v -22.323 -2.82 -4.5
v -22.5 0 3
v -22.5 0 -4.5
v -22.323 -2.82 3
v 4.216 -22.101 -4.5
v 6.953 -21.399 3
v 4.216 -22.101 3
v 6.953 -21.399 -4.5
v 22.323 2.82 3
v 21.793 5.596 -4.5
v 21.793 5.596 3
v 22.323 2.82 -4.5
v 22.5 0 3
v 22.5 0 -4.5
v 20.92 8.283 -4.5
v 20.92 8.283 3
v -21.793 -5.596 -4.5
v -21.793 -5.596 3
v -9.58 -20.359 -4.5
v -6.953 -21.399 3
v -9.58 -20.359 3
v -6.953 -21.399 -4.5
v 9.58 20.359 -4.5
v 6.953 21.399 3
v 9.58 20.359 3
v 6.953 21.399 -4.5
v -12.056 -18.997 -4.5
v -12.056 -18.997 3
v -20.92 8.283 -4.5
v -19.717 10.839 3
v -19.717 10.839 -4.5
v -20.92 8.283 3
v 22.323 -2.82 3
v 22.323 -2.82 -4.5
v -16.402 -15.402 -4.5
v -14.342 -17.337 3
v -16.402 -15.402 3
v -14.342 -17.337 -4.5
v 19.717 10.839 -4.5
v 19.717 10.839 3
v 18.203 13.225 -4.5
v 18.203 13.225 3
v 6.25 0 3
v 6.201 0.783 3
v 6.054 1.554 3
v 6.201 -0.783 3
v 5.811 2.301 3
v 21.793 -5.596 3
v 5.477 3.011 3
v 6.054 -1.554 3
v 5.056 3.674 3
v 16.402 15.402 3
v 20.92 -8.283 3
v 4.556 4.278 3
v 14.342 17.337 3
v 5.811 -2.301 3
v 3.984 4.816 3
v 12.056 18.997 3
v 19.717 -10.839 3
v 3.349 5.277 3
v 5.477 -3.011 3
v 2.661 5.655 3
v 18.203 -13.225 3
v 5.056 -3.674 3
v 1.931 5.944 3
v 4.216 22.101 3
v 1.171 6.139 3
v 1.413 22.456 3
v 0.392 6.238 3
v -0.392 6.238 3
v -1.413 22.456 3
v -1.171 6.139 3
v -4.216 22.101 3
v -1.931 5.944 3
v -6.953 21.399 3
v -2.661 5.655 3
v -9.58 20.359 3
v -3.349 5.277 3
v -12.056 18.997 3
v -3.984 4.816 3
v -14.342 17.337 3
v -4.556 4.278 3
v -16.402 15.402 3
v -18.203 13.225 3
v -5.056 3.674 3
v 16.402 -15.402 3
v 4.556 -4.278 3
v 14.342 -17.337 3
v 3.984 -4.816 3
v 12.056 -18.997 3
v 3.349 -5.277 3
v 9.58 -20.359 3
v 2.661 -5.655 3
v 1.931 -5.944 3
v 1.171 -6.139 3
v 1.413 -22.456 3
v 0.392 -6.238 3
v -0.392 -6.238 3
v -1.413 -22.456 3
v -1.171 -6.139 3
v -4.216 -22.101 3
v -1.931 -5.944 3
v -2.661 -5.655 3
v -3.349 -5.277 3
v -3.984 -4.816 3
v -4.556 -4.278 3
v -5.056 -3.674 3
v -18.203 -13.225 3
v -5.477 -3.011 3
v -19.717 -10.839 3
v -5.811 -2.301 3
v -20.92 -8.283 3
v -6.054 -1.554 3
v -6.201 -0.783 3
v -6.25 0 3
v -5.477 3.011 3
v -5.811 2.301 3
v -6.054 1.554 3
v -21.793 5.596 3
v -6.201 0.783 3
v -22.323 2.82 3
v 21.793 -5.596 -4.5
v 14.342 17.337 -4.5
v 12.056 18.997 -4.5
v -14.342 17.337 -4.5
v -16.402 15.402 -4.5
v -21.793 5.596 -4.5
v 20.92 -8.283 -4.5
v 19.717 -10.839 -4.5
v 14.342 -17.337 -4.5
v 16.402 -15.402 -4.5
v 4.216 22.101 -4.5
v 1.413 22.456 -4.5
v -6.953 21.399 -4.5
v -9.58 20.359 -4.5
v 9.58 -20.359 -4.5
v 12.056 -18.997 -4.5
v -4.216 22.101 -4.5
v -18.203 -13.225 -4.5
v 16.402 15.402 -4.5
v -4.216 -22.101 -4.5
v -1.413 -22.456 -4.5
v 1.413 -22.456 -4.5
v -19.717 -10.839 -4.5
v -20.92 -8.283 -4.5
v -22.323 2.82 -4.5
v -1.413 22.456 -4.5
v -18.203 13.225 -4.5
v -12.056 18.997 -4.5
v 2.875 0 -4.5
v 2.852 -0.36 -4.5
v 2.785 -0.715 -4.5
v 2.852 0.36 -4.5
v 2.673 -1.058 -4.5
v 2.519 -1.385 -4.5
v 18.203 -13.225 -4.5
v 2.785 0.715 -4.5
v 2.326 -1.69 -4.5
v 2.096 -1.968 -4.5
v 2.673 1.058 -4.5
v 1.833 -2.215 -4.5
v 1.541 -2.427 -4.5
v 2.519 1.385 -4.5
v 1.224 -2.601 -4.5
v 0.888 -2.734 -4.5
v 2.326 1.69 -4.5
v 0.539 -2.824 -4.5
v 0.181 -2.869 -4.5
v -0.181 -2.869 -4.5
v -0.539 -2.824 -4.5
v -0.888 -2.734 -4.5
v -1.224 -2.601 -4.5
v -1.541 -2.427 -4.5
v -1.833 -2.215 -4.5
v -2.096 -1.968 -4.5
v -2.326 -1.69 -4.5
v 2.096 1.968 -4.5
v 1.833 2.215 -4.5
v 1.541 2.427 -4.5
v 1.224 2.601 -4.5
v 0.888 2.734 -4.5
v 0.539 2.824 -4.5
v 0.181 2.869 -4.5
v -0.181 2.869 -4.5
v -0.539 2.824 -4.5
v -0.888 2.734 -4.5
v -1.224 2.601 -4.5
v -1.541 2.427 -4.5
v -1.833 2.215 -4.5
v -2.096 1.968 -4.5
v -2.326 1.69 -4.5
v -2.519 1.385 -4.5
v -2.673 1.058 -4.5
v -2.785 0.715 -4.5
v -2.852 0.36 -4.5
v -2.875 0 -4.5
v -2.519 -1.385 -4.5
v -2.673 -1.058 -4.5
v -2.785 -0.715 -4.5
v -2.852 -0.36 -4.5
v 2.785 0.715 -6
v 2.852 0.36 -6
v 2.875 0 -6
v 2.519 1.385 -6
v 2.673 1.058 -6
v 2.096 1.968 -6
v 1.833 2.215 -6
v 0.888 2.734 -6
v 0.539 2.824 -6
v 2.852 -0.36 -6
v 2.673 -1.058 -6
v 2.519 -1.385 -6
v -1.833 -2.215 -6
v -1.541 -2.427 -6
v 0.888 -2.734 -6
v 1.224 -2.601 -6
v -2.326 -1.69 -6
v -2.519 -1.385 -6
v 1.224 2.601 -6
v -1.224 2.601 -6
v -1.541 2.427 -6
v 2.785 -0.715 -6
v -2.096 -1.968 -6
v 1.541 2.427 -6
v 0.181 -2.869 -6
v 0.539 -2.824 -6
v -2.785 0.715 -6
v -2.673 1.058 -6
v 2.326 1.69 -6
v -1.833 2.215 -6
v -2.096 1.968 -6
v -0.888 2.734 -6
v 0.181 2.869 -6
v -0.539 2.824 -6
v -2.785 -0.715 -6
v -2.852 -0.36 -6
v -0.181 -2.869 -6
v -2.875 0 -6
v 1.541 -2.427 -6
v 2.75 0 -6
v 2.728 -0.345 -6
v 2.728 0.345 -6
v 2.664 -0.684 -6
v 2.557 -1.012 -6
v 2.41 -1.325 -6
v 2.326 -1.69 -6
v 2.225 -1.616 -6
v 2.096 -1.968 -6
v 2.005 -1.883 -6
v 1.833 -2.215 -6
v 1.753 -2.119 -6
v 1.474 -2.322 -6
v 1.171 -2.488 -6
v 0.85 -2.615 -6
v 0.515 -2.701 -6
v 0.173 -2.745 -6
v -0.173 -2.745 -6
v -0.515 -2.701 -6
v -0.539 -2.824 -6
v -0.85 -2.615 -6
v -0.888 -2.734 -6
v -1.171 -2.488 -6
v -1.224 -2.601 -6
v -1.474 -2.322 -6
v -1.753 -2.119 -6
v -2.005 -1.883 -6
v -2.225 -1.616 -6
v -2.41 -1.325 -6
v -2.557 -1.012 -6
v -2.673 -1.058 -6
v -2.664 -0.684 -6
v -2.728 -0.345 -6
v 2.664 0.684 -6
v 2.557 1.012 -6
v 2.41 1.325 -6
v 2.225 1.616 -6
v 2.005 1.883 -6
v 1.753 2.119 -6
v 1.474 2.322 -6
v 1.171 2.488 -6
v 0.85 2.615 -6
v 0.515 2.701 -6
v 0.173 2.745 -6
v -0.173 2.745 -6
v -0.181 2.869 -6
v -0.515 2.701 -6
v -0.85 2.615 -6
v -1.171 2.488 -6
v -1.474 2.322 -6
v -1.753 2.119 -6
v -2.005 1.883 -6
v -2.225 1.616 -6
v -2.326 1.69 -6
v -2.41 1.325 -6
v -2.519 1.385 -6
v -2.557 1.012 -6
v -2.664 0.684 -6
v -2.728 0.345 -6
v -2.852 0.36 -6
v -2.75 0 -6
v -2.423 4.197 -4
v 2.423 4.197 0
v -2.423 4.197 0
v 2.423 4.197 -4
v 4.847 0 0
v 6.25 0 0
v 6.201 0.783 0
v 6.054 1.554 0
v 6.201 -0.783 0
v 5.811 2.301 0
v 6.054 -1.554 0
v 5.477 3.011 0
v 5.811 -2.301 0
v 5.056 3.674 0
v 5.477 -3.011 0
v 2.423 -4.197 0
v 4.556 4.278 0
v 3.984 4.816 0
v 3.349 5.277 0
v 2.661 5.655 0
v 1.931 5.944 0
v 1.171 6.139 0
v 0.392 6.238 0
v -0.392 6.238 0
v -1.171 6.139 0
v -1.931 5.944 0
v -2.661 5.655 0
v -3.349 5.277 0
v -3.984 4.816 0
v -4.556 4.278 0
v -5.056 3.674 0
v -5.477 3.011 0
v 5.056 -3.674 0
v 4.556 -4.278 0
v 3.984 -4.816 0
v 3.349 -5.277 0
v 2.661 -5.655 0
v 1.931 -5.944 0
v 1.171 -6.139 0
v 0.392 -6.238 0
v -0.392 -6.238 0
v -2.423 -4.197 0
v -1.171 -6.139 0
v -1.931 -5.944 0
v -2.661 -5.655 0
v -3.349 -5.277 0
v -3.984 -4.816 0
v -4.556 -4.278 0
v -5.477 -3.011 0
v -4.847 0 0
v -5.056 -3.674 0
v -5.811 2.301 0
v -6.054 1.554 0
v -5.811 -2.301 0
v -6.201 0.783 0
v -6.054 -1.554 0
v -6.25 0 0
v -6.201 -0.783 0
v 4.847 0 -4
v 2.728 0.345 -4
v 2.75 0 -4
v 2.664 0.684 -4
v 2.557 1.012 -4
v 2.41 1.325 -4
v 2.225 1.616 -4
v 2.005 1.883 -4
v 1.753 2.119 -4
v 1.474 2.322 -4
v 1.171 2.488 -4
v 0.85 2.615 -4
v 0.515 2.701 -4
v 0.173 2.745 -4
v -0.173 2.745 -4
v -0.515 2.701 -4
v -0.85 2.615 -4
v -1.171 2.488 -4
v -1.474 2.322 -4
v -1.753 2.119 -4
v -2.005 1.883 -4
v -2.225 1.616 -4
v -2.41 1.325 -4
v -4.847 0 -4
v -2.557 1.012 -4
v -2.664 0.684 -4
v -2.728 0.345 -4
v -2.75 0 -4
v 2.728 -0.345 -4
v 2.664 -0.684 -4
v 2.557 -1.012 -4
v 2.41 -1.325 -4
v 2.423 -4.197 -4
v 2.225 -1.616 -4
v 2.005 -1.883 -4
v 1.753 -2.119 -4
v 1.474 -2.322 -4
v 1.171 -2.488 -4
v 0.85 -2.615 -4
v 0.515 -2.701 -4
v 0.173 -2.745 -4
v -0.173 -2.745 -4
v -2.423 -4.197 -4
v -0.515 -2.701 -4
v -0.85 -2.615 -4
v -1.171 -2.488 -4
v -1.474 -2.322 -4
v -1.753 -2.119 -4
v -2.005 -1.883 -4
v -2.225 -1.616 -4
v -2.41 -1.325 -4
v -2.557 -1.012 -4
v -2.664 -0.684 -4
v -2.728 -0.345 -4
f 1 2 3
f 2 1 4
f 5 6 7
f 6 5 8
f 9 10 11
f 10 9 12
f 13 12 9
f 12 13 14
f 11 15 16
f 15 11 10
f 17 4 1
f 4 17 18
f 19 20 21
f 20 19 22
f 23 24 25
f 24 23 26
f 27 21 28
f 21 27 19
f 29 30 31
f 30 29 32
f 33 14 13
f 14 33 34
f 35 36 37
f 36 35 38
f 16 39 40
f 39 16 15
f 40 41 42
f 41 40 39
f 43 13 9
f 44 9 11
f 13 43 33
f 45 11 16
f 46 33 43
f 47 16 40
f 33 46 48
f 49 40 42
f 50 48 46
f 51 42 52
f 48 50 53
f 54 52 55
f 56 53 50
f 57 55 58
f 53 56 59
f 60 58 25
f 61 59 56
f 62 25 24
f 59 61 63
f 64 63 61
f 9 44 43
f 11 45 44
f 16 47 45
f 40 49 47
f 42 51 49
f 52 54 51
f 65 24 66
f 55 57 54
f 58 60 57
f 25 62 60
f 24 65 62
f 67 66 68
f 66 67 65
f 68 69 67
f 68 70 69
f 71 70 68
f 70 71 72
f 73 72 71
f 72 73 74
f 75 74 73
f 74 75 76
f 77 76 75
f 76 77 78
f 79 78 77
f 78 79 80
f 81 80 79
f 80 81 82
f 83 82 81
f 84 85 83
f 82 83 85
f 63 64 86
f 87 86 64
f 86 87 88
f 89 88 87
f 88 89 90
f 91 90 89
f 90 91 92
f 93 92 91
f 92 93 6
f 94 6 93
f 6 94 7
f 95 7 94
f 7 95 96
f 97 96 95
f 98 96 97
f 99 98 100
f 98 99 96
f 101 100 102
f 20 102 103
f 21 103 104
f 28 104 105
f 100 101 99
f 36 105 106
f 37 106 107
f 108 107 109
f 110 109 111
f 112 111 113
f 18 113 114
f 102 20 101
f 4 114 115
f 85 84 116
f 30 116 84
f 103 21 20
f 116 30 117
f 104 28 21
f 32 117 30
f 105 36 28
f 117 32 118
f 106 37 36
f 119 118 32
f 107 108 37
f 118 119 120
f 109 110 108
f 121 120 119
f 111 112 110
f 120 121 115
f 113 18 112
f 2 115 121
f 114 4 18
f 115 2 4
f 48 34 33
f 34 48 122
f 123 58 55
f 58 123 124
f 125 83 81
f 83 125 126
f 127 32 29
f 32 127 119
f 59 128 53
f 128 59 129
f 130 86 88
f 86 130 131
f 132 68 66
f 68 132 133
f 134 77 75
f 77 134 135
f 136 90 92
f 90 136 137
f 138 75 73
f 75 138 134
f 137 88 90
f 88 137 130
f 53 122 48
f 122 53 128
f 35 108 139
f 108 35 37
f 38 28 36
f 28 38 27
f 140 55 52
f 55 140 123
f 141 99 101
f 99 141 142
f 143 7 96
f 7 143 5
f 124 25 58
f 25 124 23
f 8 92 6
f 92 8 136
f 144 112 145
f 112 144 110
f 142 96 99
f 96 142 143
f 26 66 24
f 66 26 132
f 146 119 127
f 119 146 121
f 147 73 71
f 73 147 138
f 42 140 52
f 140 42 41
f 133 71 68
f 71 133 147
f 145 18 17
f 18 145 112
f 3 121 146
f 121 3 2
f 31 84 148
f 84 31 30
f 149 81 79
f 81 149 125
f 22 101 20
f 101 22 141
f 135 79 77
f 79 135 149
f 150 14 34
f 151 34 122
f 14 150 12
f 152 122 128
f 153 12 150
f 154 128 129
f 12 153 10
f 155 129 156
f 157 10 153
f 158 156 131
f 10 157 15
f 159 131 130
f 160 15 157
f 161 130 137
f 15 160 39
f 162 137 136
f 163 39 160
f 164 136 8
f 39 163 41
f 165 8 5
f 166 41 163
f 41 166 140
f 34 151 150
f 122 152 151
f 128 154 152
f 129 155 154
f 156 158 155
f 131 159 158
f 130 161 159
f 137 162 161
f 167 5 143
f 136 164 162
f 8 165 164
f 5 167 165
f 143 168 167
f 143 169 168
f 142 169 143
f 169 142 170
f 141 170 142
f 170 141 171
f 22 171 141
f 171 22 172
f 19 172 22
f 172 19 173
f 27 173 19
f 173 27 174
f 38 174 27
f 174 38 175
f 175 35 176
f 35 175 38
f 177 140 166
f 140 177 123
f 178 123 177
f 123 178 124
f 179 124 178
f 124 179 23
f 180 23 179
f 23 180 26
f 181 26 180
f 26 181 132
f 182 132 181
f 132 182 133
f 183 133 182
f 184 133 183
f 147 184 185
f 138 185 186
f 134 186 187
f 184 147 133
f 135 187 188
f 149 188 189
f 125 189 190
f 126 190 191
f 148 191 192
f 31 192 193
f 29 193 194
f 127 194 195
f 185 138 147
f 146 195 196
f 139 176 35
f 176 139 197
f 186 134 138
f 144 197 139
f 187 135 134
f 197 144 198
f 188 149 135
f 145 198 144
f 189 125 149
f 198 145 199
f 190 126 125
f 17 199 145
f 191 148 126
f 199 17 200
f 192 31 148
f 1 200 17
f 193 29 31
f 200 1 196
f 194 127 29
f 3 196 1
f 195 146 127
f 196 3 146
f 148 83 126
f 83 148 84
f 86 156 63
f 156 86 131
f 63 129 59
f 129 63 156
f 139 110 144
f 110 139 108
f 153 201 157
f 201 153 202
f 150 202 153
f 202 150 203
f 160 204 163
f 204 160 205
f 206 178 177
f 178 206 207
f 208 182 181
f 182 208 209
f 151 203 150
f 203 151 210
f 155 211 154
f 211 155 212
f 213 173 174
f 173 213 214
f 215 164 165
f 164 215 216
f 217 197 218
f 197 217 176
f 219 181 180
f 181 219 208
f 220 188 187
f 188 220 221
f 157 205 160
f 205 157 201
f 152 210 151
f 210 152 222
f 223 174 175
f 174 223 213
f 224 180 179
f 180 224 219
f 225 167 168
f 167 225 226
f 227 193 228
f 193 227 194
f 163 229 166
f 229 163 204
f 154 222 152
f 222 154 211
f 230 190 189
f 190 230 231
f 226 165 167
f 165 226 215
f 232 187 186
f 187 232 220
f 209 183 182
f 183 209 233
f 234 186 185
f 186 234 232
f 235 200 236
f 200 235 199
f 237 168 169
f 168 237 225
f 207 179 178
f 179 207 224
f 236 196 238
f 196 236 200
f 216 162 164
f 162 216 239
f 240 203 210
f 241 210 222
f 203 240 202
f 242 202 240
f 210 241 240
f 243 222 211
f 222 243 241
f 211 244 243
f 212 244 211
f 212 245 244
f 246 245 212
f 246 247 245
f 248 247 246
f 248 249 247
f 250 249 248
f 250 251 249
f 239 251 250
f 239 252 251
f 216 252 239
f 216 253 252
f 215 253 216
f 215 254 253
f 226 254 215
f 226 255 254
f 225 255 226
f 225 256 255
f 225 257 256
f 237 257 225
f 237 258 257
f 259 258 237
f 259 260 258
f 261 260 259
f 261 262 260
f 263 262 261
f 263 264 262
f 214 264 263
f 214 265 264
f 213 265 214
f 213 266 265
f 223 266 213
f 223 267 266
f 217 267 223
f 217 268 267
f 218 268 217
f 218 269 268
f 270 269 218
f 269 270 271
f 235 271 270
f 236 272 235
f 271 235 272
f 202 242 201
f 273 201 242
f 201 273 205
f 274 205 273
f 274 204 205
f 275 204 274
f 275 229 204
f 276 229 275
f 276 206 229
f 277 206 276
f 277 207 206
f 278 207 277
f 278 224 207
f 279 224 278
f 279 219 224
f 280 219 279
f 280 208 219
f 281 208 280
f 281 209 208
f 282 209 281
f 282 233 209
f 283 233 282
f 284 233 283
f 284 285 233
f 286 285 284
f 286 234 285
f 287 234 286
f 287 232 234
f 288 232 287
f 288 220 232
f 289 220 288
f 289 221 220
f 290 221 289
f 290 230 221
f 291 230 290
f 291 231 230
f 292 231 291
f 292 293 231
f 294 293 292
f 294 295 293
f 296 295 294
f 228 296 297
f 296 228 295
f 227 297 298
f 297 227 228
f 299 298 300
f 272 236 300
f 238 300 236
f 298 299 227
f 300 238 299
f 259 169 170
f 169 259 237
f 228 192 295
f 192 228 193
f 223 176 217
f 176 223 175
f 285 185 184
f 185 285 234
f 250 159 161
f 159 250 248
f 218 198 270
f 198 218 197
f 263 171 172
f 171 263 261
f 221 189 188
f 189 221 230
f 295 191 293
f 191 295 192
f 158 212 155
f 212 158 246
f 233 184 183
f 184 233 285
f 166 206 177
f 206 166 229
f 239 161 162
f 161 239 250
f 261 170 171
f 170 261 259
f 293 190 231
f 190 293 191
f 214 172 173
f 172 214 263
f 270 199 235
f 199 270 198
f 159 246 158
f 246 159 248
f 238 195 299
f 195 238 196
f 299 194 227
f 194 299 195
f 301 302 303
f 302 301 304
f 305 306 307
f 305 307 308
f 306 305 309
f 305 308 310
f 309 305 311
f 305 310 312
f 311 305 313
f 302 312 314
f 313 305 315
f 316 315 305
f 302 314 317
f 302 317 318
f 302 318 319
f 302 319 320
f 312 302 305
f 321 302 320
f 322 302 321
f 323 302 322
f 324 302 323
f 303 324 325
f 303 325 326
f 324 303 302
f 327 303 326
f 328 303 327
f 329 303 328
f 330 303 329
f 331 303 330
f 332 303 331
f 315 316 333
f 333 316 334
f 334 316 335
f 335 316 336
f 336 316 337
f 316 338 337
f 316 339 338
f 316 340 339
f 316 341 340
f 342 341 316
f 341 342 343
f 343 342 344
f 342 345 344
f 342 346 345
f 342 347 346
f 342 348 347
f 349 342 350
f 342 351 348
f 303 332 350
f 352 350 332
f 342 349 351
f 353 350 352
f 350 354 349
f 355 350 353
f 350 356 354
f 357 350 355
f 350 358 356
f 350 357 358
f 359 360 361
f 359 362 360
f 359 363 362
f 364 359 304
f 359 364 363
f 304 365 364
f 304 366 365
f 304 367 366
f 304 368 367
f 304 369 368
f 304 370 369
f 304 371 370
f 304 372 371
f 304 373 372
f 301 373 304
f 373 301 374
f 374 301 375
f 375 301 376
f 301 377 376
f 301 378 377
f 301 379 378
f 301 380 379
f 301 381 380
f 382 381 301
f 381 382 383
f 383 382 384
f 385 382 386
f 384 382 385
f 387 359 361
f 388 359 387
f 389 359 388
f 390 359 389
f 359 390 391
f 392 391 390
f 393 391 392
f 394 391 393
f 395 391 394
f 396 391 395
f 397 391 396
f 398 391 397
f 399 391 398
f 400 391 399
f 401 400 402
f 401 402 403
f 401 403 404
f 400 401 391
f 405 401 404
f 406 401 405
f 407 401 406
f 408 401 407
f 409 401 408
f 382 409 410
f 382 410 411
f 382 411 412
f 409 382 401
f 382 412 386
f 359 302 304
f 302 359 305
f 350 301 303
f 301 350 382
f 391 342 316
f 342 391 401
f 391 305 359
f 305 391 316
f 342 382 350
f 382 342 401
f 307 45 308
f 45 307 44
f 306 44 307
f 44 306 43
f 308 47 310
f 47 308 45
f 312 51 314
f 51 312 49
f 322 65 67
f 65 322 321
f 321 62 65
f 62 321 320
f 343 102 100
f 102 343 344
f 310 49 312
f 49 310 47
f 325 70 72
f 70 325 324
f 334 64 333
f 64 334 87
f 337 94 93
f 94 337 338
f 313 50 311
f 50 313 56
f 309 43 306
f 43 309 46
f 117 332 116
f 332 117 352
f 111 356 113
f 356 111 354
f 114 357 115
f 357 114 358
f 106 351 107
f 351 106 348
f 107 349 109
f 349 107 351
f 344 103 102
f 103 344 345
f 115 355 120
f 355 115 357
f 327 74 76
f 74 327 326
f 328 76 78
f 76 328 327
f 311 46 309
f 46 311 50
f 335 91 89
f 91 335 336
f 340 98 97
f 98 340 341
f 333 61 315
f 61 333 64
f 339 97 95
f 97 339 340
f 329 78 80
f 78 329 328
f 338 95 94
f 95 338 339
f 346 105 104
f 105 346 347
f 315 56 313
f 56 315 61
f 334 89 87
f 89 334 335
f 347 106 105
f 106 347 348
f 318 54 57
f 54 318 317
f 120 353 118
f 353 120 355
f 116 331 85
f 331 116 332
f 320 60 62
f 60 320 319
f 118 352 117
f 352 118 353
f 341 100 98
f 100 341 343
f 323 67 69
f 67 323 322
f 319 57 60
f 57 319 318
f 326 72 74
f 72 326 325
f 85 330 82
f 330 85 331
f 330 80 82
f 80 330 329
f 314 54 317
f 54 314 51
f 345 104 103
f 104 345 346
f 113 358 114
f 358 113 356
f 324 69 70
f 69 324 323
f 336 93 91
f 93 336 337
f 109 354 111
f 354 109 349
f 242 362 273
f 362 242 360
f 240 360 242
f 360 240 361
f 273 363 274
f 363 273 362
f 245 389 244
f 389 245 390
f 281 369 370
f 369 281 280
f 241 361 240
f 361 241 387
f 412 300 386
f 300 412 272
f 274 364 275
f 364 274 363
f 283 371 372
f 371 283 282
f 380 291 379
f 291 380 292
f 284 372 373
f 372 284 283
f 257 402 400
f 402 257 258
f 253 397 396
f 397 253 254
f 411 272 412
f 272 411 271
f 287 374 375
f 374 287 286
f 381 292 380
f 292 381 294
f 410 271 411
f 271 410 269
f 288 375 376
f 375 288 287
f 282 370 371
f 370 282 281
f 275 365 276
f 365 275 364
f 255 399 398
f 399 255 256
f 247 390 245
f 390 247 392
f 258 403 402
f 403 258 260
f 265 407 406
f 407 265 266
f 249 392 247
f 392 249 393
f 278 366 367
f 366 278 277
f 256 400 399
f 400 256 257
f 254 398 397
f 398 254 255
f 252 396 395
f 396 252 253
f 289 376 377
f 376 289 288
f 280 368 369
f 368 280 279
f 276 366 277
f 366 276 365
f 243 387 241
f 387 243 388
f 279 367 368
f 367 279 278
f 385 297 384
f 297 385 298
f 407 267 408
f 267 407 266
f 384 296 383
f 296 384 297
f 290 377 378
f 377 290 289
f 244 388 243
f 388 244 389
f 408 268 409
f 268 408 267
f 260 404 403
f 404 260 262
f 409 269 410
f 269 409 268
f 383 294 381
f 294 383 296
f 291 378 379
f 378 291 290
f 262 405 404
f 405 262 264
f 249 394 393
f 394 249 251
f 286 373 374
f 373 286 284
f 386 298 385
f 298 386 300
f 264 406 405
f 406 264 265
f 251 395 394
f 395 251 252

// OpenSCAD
$fn = 50;


difference() {
	union() {
		translate(v = [0, 0, -4.5000000000]) {
			cylinder(h = 7.5000000000, r = 22.5000000000);
		}
		#translate(v = [0, 0, -6.0000000000]) {
			cylinder(h = 6, r = 2.8750000000);
		}
	}
	union() {
		translate(v = [0, 0, 0]) {
			rotate(a = [0, 0, 0]) {
				difference() {
					union() {
						translate(v = [0, 0, -4]) {
							linear_extrude(height = 4) {
								polygon(points = [[4.8468000000, 0.0000000000], [2.4234000000, 4.1974519271], [-2.4234000000, 4.1974519271], [-4.8468000000, 0.0000000000], [-2.4234000000, -4.1974519271], [2.4234000000, -4.1974519271]]);
							}
						}
					}
					union();
				}
			}
		}
		#cylinder(h = 3, r = 6.2500000000);
		#translate(v = [0, 0, -100.0000000000]) {
			cylinder(h = 200, r = 2.7500000000);
		}
	}
}
